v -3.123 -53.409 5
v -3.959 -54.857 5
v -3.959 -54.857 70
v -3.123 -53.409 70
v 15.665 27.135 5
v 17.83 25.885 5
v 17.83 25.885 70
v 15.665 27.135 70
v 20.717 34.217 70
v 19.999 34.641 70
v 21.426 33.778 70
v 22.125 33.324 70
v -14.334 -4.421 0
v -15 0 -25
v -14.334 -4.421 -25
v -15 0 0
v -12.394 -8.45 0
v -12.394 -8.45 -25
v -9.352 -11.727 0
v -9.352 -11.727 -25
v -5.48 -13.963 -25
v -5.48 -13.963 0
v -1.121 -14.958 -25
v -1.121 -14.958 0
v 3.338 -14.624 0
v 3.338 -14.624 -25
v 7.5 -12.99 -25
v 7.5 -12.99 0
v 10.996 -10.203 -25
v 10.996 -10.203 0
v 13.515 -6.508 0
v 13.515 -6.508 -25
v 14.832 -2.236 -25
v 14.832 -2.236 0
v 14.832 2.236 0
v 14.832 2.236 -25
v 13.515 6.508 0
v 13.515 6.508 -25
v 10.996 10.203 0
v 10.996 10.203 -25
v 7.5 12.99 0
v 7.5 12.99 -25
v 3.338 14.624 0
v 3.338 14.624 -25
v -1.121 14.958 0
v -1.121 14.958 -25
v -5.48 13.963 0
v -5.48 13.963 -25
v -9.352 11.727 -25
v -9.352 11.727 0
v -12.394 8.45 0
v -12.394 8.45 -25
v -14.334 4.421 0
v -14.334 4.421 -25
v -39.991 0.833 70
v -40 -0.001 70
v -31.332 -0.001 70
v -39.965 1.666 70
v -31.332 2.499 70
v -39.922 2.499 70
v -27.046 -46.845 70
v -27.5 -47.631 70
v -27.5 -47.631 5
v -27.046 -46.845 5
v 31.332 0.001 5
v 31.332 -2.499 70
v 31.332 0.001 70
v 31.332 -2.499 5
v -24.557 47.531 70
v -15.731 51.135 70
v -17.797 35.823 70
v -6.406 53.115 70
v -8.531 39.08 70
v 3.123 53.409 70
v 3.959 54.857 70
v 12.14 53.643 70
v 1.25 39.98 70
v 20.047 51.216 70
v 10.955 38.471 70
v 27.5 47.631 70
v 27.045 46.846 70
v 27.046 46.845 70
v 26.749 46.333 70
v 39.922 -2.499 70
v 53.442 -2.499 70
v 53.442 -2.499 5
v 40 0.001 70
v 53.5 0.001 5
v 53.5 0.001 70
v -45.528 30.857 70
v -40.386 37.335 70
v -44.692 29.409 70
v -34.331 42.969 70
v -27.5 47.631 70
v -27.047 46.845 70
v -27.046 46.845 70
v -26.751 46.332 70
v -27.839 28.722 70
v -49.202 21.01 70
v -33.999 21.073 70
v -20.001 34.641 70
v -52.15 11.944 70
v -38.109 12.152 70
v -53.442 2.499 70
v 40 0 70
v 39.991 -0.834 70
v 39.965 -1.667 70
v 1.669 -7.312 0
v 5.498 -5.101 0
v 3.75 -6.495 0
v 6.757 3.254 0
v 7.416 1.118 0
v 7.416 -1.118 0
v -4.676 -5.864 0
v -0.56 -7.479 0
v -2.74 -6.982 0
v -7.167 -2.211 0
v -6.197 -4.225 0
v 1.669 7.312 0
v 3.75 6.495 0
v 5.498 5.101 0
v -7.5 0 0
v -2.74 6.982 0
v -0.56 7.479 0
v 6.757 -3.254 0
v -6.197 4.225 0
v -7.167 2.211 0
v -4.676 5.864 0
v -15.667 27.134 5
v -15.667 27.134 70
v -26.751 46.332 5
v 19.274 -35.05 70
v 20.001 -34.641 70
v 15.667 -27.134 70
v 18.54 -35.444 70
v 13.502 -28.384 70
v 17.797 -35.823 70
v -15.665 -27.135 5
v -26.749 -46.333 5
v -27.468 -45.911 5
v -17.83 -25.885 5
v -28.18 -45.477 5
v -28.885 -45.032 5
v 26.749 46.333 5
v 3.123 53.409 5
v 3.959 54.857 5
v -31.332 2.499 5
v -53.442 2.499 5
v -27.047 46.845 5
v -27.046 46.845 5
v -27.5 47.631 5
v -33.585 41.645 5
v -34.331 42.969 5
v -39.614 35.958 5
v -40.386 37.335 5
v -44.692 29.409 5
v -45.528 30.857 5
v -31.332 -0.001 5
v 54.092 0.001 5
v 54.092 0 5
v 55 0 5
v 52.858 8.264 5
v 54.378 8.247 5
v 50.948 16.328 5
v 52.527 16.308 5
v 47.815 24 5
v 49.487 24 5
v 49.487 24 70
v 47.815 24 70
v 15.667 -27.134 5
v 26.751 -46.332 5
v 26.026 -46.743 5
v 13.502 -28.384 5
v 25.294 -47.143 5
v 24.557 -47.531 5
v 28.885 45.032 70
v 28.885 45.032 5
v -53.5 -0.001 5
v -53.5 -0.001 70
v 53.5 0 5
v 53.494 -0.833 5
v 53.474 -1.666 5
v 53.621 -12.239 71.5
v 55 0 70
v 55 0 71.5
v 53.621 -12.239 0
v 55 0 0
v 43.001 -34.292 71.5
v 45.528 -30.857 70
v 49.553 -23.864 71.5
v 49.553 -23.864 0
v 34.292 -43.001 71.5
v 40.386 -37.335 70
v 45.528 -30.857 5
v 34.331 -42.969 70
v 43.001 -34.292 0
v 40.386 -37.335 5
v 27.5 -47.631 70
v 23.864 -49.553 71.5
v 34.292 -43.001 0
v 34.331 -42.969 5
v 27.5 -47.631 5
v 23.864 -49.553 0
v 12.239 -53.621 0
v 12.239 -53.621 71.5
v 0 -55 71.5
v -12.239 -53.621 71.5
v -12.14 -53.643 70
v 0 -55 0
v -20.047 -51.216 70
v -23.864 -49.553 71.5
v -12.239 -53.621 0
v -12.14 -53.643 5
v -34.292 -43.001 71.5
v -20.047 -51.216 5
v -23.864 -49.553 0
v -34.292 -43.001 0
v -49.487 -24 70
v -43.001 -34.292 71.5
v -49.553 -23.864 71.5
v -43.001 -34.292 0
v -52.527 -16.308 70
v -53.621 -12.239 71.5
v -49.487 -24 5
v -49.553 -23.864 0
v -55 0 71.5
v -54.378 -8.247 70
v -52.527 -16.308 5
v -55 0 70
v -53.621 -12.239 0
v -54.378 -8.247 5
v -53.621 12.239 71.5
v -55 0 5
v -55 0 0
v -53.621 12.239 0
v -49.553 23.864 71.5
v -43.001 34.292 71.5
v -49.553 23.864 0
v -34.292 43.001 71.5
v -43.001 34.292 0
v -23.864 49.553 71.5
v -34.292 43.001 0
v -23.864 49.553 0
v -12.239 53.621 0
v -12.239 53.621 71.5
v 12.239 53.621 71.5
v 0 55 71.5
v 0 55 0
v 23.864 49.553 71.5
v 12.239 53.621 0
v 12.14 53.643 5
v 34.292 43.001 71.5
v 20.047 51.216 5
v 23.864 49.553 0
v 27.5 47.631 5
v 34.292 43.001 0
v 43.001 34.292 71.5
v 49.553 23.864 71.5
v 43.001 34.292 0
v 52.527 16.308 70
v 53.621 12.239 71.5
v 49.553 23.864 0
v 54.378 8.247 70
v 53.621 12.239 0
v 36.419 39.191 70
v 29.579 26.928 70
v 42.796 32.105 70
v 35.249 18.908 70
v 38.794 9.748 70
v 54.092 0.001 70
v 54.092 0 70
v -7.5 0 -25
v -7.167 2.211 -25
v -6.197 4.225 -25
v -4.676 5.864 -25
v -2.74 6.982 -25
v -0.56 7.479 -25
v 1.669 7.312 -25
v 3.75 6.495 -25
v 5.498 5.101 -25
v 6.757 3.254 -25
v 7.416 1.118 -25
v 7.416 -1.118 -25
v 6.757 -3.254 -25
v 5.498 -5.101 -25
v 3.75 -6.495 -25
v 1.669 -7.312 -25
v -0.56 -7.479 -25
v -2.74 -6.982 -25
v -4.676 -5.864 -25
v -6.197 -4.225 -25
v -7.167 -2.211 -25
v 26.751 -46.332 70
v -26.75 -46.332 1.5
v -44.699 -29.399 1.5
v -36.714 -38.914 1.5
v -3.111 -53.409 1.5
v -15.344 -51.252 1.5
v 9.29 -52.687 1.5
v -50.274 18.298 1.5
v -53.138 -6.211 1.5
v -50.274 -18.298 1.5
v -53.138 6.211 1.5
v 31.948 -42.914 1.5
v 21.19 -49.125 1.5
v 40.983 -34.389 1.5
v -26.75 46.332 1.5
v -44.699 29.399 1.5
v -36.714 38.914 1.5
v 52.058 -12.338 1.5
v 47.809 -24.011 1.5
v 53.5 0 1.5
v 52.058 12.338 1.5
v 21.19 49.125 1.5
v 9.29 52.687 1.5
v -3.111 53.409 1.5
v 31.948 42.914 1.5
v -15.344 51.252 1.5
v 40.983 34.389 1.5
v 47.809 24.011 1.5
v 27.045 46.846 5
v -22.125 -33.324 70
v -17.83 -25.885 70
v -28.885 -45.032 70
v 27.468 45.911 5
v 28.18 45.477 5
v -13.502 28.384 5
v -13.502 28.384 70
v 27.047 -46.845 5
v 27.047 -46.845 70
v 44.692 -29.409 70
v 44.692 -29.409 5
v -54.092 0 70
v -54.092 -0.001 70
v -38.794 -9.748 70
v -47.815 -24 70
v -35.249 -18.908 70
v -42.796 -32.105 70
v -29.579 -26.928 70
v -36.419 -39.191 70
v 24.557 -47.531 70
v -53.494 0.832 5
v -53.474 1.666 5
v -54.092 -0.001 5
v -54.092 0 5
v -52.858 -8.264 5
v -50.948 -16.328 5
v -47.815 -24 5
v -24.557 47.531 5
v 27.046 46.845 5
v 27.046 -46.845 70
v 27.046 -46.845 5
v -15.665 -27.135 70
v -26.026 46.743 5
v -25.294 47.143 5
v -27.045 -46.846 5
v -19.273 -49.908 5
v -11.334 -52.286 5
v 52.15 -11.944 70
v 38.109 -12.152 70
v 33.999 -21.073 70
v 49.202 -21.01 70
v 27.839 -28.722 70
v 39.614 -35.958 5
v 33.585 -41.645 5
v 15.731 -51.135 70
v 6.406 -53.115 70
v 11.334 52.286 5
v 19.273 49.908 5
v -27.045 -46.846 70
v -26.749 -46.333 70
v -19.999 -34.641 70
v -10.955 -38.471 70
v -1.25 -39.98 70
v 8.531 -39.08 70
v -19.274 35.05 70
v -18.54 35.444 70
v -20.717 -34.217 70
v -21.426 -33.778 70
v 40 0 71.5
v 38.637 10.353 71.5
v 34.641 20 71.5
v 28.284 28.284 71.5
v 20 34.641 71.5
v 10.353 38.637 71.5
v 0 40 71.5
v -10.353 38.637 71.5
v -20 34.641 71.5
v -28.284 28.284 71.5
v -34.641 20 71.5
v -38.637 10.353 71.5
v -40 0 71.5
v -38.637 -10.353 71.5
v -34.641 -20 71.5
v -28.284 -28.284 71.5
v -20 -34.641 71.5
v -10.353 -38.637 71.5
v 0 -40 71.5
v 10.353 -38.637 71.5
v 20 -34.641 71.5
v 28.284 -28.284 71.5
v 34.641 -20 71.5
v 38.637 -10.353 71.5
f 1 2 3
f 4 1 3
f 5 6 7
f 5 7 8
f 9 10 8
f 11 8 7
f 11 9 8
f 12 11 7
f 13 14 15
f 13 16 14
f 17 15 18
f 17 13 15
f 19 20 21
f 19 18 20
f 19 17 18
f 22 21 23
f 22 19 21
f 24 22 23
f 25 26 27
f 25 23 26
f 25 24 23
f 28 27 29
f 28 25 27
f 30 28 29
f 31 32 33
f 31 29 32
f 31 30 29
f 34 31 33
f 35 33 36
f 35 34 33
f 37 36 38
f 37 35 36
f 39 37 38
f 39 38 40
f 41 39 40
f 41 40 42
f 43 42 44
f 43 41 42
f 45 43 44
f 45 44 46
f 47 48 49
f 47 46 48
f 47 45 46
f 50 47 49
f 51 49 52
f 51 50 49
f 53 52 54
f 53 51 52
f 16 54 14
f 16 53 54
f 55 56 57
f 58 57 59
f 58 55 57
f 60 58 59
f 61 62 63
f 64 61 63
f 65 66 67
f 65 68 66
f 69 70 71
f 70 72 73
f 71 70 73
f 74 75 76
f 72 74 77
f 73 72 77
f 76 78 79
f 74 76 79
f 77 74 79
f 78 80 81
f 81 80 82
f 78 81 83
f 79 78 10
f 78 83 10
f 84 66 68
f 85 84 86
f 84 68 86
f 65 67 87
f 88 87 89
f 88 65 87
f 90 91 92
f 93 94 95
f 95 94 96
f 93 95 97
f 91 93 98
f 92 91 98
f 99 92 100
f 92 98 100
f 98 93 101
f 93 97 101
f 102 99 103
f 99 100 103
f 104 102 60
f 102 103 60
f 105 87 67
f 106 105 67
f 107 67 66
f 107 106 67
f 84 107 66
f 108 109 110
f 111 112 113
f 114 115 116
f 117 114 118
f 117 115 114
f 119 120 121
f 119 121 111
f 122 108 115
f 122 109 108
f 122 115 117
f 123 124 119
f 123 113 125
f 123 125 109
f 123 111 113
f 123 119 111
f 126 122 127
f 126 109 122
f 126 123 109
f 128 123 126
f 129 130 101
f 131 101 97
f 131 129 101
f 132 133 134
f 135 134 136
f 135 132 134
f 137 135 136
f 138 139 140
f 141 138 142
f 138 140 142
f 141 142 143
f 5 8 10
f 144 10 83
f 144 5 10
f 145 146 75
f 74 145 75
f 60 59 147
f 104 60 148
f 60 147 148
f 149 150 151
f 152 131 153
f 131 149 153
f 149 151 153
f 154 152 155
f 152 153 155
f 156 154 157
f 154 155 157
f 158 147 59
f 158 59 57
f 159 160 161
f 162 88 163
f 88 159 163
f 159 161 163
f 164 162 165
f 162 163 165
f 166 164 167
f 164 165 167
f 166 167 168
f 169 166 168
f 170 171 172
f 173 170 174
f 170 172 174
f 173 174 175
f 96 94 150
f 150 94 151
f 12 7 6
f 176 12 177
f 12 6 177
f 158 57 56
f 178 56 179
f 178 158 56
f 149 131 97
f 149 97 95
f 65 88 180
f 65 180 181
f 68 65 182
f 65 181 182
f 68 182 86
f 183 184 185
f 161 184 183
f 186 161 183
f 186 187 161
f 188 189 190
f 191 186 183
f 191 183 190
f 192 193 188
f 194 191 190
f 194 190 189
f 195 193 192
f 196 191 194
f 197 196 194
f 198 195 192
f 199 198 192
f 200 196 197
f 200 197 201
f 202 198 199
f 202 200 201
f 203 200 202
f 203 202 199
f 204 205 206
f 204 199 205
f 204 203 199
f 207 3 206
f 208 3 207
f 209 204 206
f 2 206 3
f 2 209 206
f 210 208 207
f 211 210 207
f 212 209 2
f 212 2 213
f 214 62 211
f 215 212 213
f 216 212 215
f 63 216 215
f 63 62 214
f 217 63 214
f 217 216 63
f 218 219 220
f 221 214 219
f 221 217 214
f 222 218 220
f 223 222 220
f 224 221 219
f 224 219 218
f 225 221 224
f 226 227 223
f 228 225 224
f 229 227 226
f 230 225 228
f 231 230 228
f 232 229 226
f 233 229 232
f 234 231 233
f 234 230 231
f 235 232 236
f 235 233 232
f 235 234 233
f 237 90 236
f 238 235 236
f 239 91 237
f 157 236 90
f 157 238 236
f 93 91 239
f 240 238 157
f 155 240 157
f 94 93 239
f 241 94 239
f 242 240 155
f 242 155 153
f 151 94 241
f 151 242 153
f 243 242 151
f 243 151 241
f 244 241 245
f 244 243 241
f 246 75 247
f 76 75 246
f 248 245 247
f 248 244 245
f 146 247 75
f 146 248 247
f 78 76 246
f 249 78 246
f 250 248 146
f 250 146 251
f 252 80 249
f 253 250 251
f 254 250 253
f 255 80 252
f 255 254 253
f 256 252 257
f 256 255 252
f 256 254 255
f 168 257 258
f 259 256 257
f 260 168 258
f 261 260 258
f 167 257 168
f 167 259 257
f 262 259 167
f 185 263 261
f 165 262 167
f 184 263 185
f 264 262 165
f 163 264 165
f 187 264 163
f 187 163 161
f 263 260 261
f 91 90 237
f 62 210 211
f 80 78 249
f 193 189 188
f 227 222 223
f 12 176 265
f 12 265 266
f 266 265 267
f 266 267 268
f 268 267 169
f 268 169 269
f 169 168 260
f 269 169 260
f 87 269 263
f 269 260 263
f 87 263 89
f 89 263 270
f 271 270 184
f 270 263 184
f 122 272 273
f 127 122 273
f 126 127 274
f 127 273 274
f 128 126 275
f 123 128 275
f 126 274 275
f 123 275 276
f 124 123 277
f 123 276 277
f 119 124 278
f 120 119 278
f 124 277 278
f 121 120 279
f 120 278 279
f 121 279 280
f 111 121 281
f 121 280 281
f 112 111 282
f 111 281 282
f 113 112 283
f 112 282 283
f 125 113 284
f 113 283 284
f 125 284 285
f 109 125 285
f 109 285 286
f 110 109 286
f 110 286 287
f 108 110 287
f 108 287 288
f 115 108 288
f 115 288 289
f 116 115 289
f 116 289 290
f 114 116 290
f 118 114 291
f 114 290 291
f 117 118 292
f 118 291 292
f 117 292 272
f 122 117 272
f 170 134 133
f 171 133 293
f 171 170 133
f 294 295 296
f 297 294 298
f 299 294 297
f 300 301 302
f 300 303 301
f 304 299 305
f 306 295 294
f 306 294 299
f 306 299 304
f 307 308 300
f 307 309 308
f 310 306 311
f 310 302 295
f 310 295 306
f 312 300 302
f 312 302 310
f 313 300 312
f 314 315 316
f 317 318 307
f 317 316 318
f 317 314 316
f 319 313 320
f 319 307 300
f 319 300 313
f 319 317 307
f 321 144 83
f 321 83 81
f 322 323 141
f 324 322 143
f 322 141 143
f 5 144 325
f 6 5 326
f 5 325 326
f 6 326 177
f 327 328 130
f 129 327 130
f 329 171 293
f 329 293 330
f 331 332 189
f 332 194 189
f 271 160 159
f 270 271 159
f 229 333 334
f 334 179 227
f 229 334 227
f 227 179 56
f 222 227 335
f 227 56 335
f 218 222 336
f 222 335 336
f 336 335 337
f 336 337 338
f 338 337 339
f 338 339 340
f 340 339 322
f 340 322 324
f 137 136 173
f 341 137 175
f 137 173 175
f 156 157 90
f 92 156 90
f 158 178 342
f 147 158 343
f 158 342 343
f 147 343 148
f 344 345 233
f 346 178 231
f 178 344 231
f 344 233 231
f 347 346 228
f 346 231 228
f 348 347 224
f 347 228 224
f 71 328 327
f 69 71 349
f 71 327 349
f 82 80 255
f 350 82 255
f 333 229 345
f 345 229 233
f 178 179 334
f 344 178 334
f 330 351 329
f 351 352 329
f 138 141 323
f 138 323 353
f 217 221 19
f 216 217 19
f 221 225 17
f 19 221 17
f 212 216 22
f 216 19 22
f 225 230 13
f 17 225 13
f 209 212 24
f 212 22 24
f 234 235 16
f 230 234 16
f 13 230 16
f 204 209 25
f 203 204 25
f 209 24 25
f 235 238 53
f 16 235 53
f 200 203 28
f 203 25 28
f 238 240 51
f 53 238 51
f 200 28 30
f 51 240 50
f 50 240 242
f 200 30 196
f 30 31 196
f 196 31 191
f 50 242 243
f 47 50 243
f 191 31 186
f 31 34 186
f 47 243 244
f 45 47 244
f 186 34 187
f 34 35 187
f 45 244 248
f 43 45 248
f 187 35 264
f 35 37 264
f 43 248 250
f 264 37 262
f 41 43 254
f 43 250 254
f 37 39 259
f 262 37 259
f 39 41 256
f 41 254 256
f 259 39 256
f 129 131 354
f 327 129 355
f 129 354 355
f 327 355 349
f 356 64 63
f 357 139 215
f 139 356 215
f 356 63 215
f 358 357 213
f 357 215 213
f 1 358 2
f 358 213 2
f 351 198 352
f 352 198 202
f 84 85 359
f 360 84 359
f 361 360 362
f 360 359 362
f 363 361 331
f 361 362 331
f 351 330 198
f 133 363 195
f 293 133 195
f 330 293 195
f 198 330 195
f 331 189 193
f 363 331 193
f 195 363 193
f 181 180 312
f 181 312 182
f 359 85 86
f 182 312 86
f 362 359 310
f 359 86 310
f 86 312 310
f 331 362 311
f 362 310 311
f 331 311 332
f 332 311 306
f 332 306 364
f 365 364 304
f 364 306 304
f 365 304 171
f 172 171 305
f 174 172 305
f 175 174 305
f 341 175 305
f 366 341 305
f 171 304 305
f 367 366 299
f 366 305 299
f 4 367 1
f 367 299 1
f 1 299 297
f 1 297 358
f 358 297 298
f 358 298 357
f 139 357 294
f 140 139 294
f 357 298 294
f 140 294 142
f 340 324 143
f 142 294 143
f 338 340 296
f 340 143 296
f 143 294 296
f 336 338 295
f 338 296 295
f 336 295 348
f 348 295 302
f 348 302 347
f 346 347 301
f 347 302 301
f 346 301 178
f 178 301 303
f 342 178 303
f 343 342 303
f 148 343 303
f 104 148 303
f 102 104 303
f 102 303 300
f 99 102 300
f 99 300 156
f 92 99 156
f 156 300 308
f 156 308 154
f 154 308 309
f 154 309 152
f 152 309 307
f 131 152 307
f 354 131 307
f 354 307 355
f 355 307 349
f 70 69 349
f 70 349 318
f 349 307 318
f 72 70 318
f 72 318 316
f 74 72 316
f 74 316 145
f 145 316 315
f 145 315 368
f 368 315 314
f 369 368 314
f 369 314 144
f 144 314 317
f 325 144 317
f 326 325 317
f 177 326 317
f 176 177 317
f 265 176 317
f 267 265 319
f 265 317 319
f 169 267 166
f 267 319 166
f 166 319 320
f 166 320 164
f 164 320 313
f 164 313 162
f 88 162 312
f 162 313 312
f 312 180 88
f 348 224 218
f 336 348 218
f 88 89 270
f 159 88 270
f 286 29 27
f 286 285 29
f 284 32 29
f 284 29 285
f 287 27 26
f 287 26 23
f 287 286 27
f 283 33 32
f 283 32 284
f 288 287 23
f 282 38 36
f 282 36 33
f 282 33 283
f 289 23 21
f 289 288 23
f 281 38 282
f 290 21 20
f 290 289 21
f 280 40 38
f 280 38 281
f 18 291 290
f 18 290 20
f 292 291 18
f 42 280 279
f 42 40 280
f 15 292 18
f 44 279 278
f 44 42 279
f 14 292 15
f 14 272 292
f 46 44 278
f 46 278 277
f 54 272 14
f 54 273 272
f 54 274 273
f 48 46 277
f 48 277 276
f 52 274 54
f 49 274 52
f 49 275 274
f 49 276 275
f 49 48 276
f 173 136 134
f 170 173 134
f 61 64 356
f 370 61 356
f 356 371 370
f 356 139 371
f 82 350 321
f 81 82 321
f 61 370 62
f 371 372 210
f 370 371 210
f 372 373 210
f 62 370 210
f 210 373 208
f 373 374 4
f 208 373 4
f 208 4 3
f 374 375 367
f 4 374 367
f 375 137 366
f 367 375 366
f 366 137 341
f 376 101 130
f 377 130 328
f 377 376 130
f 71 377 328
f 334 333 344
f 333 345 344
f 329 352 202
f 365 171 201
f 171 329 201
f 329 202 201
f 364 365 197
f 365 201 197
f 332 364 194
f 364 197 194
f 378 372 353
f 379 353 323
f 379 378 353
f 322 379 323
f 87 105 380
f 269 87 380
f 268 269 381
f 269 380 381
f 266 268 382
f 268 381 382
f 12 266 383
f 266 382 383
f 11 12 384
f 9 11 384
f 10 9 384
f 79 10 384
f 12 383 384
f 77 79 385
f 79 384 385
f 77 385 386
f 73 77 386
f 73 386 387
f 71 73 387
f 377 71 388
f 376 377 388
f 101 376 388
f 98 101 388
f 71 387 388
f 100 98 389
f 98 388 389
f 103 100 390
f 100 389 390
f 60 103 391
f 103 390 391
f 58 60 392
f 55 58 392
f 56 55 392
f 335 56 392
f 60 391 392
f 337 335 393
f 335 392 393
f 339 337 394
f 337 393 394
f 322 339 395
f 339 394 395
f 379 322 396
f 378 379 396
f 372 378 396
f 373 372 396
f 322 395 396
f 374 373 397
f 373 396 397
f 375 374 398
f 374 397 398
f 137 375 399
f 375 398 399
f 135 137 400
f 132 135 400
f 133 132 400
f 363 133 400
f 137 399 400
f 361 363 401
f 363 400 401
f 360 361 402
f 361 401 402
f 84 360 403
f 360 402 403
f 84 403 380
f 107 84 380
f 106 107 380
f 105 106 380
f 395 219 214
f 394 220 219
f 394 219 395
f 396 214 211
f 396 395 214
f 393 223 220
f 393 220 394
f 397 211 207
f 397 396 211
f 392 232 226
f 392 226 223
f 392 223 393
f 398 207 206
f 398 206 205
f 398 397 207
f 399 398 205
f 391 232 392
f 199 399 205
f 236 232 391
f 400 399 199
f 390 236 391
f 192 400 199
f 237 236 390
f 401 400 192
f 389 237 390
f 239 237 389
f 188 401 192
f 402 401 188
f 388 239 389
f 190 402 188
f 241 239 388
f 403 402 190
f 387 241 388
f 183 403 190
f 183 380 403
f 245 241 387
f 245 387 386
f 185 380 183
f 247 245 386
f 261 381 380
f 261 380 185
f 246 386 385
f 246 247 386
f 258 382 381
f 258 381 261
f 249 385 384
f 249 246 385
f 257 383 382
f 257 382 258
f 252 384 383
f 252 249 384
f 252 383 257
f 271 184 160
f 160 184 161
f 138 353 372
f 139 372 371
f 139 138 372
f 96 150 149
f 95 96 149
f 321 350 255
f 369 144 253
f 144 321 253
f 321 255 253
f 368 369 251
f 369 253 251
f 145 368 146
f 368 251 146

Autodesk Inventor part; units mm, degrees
ref_plane "YZ Plane" through (0, 0, 0) normal (1, 0, 0) x (0, 1, 0)
ref_plane "XZ Plane" through (0, 0, 0) normal (0, 1, 0) x (-1, 0, 0)
sketch "Sketch1" plane through (0, 0, 0) normal (0, 0, 1) x (1, 0, 0)
  circle A0 centre (0, 0) radius 55
  dimension "d0" = 110
extrude "Extrusion1" add sketch "Sketch1" along normal blind 71.5
shell "Shell1" thickness 1.5 removed faces 1 at (13.749, -10.4033, 71.5)
sketch "Sketch2" plane through (0, 0, 71.5) normal (0, 0, 1) x (1, 0, 0)
  circle A0 centre (0, 0) radius 55 projected
  circle A1 centre (0, 0) radius 55
  circle A2 centre (0, 0) radius 40
  dimension "d4" = 110
  dimension "d5" = 80
extrude "Extrusion2" add sketch "Sketch2" against normal blind 1.5
sketch "Sketch3" plane through (0, 0, 0) normal (0, 0, -1) x (-1, 0, 0)
  circle A0 centre (0, 0) radius 15
  dimension "d8" = 30
extrude "Extrusion3" add sketch "Sketch3" along normal blind 25
sketch "Sketch4" plane through (0, 0, -25) normal (0, 0, -1) x (-1, 0, 0)
  circle A0 centre (0, 0) radius 7.5
  dimension "d11" = 15
extrude "Extrusion4" cut sketch "Sketch4" against normal blind 25
sketch "Sketch5" plane through (0, 0, 1.5) normal (0, 0, 1) x (1, 0, 0)
  circle A0 centre (0, 0) radius 7.5 construction
  line L0 (0, 0) -> (0, -95.8386) construction
  line L1 (0, 0) -> (-58.9042, -102.025)
  dimension "d14" = 30
ref_plane "Work Plane1" through (-58.9042, -102.025, 1.5) normal (-0.5, -0.866, 0) x (0.866, -0.5, 0)
sketch "Sketch7" plane through (-58.9042, -102.025, 1.5) normal (-0.5, -0.866, 0) x (0.866, -0.5, 0)
  line L0 (53.5, 0) -> (-53.5, 0) projected
  line L1 (55, -1.5) -> (-55, -1.5) projected
  line L2 (0, 3.5) -> (24, 3.5)
  line L3 (24, 3.5) -> (24, 68.5)
  line L4 (24, 68.5) -> (0, 68.5)
  line L5 (0, 68.5) -> (0, 3.5)
  line L6 (55, 70) -> (-55, 70) projected
  point P0 (0, -1.5)
  point P1 (0, -1.5)
  dimension "d18" = 5
  dimension "d19" = 65
  dimension "d20" = 24
  dimension "d21" = 0
  dimension "d22" = 1.5
extrude "Extrusion5" cut sketch "Sketch7" against normal blind 110.75
pattern_circular "Circular Pattern1" count 6 over 360 about axis through (0, 0, 0) along (0, 0, 1) of "Extrusion5"
sketch "Sketch12" plane through (0, 0, 5) normal (0, 0, 1) x (0.958, -0.2869, 0)
  line L0 (9.6549, 29.9119) -> (14.7648, 51.483)
  line L1 (14.7648, 51.483) -> (14.9013, 52.0593)
  line L2 (7.2222, 30.4881) -> (12.3321, 52.0593)
  line L3 (12.3321, 52.0593) -> (12.4686, 52.6356)
  line L4 (14.9013, 52.0593) -> (12.4686, 52.6356)
  line L5 (12.6779, 53.5189) -> (12.3321, 52.0593) projected
  line L6 (9.6549, 29.9119) -> (7.2222, 30.4881)
  point P0 (0, 0)
  point P1 (8.4385, 30.2)
  dimension "d34" = 2.5
  dimension "d35" = 30.2
extrude "Extrusion7" add sketch "Sketch12" along normal blind 65
pattern_circular "Circular Pattern2" count 6 over 360 about axis through (0, 0, -25) along (0, 0, 1) of "Extrusion7"
properties part number "Cilindro do Motor Industrial" material "Iron, Cast"
